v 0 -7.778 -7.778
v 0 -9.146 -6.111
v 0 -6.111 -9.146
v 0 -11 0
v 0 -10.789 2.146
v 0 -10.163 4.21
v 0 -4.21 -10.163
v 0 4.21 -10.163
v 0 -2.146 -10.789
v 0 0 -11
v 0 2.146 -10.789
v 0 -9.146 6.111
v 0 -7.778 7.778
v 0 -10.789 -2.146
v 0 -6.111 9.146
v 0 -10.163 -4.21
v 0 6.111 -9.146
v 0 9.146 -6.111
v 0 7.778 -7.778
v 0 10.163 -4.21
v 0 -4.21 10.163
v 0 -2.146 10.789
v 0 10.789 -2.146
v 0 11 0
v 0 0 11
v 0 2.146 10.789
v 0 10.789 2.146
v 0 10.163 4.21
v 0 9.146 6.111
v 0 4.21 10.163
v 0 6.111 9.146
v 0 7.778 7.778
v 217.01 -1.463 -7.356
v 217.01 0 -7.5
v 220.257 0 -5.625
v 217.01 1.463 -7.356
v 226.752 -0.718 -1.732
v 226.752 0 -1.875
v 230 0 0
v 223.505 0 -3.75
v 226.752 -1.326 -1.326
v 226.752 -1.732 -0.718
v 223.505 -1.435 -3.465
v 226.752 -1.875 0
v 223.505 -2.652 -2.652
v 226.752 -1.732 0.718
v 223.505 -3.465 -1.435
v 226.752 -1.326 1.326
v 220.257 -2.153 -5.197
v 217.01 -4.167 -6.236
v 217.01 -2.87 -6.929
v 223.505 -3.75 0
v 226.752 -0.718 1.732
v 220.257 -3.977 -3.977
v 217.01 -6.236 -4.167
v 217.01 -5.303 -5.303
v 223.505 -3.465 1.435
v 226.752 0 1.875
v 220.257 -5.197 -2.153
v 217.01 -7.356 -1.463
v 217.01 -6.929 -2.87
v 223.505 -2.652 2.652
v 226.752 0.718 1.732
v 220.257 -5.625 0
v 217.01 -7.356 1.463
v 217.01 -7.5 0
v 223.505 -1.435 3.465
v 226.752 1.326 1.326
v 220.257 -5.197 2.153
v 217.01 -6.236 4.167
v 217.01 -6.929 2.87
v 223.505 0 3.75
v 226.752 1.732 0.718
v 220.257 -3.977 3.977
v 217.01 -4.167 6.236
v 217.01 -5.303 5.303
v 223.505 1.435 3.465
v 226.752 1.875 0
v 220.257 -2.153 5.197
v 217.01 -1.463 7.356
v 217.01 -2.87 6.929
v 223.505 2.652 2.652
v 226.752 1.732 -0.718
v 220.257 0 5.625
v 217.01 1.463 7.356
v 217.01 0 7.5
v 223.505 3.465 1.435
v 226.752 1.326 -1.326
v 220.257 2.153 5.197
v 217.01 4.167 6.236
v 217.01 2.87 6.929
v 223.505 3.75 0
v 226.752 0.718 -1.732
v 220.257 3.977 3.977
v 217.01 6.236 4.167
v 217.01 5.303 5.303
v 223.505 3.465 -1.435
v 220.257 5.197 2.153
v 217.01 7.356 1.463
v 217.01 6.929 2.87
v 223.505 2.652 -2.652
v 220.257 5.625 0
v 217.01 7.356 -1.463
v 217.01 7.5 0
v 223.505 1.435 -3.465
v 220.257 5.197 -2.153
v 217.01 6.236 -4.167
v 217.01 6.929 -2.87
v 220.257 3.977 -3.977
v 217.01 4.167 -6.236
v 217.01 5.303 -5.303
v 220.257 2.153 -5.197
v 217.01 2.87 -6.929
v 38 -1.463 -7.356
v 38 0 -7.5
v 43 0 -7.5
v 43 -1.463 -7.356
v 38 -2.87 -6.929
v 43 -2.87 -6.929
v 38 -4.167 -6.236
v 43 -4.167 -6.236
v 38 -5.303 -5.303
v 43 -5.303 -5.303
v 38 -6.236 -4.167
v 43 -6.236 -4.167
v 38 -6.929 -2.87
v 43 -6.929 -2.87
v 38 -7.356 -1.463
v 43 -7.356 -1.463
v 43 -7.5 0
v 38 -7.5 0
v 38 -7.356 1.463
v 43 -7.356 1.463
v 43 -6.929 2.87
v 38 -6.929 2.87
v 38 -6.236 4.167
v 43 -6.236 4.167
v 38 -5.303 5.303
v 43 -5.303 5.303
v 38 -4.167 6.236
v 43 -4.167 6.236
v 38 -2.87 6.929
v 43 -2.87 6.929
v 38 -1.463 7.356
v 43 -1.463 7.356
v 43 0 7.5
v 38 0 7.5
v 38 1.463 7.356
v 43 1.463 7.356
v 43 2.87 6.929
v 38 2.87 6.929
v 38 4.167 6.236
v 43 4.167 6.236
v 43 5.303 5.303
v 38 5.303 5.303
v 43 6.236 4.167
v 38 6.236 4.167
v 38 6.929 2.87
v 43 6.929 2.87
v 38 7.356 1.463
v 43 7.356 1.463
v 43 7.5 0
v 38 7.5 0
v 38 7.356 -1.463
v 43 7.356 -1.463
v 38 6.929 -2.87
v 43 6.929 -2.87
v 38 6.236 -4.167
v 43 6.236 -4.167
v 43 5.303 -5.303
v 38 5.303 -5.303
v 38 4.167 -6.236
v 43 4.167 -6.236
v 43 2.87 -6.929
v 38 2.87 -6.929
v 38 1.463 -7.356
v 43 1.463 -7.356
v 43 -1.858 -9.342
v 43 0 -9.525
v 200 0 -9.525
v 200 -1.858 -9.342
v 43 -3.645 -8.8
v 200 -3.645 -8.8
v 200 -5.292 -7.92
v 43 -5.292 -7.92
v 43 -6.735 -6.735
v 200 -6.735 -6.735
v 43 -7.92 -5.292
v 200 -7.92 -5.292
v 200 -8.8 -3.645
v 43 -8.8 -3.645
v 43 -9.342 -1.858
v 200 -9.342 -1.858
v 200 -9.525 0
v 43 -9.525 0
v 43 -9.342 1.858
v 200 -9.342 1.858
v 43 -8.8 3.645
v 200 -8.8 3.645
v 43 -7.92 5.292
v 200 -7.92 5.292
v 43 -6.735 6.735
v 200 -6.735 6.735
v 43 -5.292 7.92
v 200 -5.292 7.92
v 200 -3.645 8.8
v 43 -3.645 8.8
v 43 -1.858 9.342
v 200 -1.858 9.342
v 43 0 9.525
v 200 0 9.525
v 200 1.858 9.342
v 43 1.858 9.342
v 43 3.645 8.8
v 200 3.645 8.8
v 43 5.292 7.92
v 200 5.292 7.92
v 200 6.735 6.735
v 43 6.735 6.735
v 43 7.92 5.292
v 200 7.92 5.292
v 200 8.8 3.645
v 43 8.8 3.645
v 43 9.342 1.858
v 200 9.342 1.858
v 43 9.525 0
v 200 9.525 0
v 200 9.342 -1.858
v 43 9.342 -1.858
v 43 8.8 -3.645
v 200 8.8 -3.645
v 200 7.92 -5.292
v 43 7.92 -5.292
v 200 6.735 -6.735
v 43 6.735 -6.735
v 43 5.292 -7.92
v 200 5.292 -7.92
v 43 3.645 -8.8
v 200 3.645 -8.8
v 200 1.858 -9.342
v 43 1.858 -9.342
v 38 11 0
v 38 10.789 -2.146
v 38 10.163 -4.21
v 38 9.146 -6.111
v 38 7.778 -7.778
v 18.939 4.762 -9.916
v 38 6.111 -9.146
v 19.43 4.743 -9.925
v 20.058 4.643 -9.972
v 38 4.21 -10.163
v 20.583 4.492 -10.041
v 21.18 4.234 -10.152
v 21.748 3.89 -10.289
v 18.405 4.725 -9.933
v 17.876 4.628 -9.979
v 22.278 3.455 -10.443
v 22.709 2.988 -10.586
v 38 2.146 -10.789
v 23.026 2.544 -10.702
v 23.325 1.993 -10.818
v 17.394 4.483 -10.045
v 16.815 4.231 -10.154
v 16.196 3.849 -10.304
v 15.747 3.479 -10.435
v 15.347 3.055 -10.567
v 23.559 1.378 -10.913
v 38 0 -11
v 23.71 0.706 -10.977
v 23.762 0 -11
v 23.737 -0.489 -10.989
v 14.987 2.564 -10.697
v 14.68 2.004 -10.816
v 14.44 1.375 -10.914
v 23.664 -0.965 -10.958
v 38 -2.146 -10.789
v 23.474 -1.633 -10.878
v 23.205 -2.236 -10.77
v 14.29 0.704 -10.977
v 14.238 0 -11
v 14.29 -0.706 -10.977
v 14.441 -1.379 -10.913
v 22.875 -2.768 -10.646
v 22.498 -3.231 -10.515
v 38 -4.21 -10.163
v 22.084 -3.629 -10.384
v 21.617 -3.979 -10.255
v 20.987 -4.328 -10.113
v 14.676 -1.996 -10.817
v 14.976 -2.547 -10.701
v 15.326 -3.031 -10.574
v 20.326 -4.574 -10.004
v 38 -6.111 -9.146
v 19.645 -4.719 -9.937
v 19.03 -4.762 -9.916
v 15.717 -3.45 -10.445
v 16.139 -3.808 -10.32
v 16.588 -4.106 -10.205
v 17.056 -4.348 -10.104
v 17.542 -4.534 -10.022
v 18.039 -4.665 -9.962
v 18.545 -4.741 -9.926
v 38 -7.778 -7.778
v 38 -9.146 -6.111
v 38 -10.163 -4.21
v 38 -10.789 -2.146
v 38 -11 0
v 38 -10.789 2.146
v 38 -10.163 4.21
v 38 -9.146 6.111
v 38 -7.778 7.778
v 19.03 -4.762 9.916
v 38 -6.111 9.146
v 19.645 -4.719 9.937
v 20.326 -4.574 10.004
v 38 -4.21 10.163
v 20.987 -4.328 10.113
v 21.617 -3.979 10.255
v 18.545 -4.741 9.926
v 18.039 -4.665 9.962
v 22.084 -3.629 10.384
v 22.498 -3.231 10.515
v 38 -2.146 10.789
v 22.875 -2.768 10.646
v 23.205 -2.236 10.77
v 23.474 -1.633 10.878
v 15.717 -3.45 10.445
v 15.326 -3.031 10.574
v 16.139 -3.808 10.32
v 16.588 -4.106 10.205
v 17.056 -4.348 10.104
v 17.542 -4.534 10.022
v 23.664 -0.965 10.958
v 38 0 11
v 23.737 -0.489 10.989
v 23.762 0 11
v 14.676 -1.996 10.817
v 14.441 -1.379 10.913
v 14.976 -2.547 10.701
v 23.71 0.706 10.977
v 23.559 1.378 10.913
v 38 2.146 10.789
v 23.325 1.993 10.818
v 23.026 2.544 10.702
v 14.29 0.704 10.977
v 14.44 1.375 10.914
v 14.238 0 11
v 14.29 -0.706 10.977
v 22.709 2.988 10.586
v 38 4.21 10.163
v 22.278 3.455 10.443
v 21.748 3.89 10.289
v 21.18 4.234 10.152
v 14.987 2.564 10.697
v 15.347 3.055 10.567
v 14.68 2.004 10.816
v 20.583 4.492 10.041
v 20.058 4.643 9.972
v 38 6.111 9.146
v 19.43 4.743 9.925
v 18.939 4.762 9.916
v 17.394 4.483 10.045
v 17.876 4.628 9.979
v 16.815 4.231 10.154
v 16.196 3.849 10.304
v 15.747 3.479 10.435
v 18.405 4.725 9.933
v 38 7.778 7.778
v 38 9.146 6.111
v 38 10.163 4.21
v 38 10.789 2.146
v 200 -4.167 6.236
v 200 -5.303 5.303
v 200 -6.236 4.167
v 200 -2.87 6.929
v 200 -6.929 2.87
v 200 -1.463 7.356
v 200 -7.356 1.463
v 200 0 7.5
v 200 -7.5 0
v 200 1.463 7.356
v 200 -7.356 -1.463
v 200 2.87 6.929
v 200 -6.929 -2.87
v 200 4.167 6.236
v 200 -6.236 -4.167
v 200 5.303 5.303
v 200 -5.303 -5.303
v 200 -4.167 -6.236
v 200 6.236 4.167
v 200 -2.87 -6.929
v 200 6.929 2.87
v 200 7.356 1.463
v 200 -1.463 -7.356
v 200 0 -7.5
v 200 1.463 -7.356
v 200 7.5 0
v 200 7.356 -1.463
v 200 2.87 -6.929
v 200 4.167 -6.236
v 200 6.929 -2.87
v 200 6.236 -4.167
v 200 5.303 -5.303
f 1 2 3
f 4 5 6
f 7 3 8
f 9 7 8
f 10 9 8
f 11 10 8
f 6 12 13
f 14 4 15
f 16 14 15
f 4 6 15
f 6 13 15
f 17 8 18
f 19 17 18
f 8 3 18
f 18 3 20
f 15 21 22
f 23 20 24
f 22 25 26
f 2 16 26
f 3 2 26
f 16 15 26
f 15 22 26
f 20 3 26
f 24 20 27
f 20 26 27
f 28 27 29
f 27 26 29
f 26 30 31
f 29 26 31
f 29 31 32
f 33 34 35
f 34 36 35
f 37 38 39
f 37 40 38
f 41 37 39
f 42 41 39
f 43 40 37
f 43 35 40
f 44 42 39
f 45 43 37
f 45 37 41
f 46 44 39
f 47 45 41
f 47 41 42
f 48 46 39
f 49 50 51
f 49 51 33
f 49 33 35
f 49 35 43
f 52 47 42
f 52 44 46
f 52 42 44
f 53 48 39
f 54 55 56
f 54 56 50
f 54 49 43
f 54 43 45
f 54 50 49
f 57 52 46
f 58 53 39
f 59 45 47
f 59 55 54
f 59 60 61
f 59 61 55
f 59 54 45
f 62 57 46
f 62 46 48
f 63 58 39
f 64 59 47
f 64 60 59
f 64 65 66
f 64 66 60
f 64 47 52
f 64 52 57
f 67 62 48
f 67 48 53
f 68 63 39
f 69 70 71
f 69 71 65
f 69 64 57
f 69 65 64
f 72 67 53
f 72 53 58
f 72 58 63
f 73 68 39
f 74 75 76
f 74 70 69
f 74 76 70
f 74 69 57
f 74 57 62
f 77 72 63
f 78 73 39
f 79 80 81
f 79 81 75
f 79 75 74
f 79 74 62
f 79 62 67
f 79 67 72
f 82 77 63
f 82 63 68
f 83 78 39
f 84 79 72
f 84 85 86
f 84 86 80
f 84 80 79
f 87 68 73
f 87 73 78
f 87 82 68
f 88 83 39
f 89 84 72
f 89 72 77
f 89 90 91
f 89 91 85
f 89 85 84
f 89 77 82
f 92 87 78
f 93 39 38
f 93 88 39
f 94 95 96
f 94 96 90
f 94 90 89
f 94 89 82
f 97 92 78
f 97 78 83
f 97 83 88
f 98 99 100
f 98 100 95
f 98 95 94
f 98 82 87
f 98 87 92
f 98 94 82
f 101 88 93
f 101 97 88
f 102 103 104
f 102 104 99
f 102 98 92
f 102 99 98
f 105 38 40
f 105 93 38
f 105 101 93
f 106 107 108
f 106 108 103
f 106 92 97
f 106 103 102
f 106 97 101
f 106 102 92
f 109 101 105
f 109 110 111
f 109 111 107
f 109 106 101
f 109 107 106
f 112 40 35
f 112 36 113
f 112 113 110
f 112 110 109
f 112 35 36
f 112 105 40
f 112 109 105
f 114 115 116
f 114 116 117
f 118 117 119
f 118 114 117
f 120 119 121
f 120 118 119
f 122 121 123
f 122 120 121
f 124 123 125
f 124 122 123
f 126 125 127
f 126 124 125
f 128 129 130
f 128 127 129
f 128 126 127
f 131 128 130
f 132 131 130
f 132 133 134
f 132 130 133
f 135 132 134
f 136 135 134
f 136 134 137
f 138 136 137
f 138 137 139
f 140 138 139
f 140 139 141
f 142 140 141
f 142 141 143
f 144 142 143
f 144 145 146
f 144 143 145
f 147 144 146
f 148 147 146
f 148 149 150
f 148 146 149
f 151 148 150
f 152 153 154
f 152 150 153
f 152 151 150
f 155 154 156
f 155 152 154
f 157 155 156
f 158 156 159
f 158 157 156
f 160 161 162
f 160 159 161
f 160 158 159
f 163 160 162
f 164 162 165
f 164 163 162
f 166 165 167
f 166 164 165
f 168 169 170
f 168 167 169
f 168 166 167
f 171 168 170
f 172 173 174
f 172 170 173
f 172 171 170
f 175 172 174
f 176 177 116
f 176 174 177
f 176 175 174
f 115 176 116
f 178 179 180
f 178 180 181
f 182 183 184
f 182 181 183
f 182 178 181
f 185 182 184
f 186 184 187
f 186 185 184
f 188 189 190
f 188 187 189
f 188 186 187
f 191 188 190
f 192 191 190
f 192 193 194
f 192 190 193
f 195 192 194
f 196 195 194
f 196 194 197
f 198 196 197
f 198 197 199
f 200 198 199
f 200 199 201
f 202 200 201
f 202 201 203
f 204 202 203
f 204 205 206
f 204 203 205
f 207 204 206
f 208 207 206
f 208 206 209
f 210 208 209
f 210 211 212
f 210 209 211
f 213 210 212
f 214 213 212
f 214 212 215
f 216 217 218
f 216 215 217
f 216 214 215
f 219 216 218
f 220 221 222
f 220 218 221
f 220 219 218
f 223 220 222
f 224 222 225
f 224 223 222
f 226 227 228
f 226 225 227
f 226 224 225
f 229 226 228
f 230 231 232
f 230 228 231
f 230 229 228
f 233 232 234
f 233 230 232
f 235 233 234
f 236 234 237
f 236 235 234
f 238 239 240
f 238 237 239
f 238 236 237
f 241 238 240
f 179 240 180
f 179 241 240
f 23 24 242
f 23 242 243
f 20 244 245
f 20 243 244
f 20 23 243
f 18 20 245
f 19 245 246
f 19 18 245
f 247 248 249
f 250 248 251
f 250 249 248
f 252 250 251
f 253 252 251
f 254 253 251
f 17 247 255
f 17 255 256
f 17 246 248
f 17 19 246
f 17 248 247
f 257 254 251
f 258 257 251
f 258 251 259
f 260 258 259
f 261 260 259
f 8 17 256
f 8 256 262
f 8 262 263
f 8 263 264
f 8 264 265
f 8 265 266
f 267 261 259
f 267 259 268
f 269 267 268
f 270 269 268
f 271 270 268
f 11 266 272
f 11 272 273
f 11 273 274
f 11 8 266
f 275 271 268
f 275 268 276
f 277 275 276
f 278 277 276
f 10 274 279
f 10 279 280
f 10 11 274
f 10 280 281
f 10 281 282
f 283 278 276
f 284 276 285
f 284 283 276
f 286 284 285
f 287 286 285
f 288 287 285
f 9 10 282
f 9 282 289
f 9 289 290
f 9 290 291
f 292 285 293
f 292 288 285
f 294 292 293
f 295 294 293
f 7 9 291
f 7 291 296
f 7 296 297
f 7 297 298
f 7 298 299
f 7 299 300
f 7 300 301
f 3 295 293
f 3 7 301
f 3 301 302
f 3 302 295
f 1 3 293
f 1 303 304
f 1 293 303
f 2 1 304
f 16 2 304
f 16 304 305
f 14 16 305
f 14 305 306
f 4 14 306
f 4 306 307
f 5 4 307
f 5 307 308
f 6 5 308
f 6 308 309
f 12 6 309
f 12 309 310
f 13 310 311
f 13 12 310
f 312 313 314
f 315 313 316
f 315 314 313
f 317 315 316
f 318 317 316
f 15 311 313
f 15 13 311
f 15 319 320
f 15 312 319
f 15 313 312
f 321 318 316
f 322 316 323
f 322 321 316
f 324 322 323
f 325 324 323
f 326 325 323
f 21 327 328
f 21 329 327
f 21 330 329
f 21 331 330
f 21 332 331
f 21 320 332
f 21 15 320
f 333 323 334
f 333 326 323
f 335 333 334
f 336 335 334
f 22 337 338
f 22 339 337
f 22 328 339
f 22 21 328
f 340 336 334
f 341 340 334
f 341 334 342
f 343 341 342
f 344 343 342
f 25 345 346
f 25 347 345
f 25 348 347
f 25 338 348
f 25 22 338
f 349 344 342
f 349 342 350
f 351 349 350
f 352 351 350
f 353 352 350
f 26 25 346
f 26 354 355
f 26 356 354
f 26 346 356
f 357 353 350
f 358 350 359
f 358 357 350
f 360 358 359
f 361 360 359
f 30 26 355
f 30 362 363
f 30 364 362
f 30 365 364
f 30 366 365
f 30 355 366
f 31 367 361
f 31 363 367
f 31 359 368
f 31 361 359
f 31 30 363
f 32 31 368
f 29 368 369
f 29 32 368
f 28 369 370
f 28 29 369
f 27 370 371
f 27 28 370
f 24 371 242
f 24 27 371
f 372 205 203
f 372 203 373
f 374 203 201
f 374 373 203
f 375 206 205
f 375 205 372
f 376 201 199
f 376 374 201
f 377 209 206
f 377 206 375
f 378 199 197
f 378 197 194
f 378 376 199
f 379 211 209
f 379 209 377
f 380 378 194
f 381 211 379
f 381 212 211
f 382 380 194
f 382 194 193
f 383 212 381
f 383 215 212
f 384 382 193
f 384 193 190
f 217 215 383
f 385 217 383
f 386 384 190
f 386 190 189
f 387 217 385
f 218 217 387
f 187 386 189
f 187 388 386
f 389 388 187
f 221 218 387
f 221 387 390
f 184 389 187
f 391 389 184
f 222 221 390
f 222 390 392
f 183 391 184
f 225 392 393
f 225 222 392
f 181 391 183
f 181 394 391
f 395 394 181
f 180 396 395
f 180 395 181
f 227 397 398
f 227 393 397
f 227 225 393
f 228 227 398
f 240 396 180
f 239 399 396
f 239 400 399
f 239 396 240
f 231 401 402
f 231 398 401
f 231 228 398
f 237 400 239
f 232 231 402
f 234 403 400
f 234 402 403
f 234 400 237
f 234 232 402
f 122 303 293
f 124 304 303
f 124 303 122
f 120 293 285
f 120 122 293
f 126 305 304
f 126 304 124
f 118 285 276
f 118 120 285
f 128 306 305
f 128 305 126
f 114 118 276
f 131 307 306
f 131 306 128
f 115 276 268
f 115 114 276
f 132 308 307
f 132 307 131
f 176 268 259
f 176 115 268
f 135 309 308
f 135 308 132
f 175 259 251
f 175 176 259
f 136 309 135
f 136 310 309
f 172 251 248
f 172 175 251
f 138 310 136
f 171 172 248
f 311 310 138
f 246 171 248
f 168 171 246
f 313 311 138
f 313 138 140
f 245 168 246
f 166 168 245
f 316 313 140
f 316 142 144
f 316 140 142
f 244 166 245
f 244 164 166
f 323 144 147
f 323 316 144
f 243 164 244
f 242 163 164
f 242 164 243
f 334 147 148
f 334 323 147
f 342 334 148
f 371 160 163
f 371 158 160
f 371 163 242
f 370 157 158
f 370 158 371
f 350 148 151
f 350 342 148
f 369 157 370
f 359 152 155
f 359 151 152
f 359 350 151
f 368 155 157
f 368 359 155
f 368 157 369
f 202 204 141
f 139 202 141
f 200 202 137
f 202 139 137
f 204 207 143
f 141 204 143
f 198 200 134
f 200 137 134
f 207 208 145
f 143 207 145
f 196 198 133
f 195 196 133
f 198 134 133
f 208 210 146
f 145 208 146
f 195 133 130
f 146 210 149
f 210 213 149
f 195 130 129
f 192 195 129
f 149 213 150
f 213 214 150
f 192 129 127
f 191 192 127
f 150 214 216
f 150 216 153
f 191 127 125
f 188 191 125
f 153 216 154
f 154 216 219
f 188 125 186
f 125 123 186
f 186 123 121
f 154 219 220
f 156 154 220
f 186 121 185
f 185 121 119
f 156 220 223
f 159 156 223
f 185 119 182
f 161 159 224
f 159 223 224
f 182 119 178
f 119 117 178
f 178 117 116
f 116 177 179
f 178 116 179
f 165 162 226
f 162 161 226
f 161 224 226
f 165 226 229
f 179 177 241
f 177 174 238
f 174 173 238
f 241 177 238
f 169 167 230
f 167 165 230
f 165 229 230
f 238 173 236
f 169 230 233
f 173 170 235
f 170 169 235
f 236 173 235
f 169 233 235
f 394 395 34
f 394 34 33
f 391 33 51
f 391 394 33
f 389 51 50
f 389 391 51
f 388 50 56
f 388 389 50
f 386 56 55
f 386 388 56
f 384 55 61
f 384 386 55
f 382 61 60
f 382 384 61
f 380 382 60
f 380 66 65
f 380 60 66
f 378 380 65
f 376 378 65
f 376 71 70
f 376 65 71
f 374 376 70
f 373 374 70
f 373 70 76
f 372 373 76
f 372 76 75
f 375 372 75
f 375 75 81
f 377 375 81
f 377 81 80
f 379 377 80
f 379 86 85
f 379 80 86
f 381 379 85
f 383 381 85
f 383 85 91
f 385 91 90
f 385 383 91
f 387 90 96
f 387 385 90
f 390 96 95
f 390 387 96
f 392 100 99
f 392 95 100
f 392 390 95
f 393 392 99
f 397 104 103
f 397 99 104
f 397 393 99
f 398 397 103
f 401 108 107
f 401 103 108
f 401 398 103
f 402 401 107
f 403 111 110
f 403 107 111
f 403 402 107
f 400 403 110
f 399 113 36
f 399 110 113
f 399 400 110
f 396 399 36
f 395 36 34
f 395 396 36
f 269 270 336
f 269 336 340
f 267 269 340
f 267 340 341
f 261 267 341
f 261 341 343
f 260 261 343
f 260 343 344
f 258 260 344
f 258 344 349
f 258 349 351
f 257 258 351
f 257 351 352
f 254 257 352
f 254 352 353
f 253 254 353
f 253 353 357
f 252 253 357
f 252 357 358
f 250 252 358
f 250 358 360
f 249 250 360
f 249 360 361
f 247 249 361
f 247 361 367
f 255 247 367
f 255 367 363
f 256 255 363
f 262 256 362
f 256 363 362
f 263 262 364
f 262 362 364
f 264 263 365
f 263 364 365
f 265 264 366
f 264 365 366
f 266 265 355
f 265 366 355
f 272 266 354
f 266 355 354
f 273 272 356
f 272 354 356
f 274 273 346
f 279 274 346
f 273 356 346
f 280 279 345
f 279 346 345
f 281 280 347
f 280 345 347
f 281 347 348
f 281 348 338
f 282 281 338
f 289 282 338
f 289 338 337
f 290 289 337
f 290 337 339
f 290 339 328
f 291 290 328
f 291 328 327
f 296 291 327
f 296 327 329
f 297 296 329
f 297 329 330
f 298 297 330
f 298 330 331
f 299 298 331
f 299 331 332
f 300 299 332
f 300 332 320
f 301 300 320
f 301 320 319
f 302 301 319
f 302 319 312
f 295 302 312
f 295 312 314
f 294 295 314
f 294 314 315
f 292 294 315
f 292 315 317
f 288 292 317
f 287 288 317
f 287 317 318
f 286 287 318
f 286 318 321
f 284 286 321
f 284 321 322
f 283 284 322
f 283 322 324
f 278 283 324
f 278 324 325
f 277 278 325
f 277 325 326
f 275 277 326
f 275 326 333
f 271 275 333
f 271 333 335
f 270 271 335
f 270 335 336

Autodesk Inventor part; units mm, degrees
ref_plane "YZ Plane" through (0, 0, 0) normal (1, 0, 0) x (0, 1, 0)
ref_plane "XZ Plane" through (0, 0, 0) normal (0, 1, 0) x (-1, 0, 0)
sketch "Sketch1" plane through (0, 0, 0) normal (1, 0, 0) x (0, 1, 0)
  circle A0 centre (0, 0) radius 11
  dimension "d0" = 22
extrude "Extrusion1" add sketch "Sketch1" along normal blind 38
sketch "Sketch2" plane through (38, 0, 0) normal (1, 0, 0) x (0, 0, -1)
  circle A0 centre (0, 0) radius 7.5
  dimension "d3" = 15
extrude "Extrusion2" add sketch "Sketch2" along normal blind 5
ref_plane "Work Plane1" through (0, 0, 11) normal (0, 0, 1) x (1, 0, 0)
sketch "Sketch3" plane through (0, 0, 11) normal (0, 0, 1) x (1, 0, 0)
  line L0 (0, 0) -> (19, 0) construction
  circle A0 centre (19, 0) radius 4.7625
  dimension "d7" = 19
  dimension "d8" = 9.525
extrude "Extrusion3" cut sketch "Sketch3" against normal blind 22
sketch "Sketch4" plane through (43, 0, 0) normal (1, 0, 0) x (0, 0, -1)
  circle A0 centre (0, 0) radius 9.525
  dimension "d11" = 19.05
extrude "Extrusion4" add sketch "Sketch4" along normal blind 157
sketch "Sketch5" plane through (200, 0, 0) normal (1, 0, 0) x (0, 0, -1)
  circle A0 centre (0, 0) radius 7.5
  dimension "d14" = 15
extrude "Extrusion5" add sketch "Sketch5" along normal blind 30
chamfer "Chamfer1" distance 7.5 angle 60 1 edges at (230, 0, 7.5) measured on face at (230, -0.5635, 2.141)
thread "Thread1" size "M20x1.5" class "6g" standard "ANSI Metric M Profile" full length
properties part number "parafuso"
